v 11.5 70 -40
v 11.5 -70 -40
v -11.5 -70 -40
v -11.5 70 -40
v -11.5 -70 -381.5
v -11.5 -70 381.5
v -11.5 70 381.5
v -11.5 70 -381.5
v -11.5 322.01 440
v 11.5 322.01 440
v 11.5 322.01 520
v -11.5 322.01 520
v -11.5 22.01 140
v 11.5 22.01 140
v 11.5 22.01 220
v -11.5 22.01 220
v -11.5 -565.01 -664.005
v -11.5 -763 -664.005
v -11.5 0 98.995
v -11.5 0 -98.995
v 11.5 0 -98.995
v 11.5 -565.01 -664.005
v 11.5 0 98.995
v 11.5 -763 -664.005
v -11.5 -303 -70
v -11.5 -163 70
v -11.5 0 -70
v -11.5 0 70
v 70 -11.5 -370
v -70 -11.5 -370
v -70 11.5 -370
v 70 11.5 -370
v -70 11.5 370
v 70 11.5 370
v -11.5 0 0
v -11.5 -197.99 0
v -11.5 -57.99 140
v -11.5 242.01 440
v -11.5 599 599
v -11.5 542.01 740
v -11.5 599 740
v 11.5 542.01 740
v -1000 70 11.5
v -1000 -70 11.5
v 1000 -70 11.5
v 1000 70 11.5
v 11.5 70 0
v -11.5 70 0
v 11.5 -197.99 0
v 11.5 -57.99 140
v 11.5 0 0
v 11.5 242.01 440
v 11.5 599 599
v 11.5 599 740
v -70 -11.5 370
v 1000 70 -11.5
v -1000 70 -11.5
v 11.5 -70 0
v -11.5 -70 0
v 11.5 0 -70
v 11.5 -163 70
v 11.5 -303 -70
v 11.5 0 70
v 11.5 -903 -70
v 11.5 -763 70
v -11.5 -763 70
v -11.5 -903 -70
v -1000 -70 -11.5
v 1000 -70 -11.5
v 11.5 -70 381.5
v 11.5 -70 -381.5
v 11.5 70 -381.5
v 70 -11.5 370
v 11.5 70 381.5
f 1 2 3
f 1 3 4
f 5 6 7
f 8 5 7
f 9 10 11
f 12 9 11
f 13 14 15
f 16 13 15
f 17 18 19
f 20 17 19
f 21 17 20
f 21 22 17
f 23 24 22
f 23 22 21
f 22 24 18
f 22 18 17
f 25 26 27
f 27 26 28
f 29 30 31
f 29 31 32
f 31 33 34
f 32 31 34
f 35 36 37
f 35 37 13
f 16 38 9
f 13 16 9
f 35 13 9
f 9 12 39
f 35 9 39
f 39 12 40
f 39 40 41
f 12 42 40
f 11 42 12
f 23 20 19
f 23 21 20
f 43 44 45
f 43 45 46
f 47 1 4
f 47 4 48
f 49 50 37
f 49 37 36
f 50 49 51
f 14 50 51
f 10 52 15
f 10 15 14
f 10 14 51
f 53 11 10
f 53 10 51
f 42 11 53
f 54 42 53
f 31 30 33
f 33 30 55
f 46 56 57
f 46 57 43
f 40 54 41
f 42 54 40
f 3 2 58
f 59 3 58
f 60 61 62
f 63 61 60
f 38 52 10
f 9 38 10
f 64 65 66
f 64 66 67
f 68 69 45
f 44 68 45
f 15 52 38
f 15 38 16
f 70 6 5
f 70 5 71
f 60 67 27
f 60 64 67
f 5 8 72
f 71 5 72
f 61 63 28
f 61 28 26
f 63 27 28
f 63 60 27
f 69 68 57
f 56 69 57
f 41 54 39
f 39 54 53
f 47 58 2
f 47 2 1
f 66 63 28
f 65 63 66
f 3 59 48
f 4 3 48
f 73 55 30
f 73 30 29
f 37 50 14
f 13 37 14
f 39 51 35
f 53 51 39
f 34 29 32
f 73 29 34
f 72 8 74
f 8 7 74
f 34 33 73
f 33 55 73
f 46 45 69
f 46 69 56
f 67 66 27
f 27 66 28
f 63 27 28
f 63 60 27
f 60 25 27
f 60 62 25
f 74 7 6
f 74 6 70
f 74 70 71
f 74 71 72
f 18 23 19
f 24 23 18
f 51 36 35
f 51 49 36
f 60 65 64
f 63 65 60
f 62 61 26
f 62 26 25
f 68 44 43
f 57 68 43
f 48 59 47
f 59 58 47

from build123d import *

# Parameters (mm, degrees)
F0_W      = 140
F0_H      = 23
F1_DEPTH  = 1000
F2_W      = 23
F2_H      = 140
F3_DEPTH  = 381.5
F5_DEPTH  = 11.5
F7_DEPTH  = 11.5
F9_DEPTH  = 11.5
F10_W     = 140
F10_H     = 740
F11_DEPTH = 11.5
F13_DEPTH = 11.5
F15_DEPTH = 23
F17_DEPTH = 23
F19_DEPTH = 23
F20_W     = 140
F20_H     = 40
F21_DEPTH = 11.5


with BuildPart() as f1:
    # F0 (on Right) → F1 (new body, symmetric)
    with BuildSketch(Plane.YZ):
        Rectangle(F0_W, F0_H)
    extrude(amount=F1_DEPTH, both=True)


with BuildPart() as f3:
    # F2 (on Top) → F3 (new body, symmetric)
    with BuildSketch(Plane.XY):
        Rectangle(F2_W, F2_H)
    extrude(amount=F3_DEPTH, both=True)


with BuildPart() as f5:
    # F4 (on Right) → F5 (new body, symmetric)
    with BuildSketch(Plane.YZ):
        Polygon((0, -98.9949493661), (0, 98.9949493661), (-763, -664.0050506339), (-565.0101012678, -664.0050506339), align=None)
    extrude(amount=F5_DEPTH, both=True)


with BuildPart() as f7:
    # F6 (on Right) → F7 (new body, symmetric)
    with BuildSketch(Plane.YZ):
        Polygon((0, -70), (0, 70), (-163, 70), (-303, -70), align=None)
    extrude(amount=F7_DEPTH, both=True)


with BuildPart() as f9:
    # F8 (on Right) → F9 (new body, symmetric)
    with BuildSketch(Plane.YZ):
        Polygon((0, -70), (0, 70), (-763, 70), (-903, -70), align=None)
    extrude(amount=F9_DEPTH, both=True)


with BuildPart() as f11:
    # F10 (on Front) → F11 (new body, symmetric)
    with BuildSketch(Plane.XZ):
        Rectangle(F10_W, F10_H)
    extrude(amount=F11_DEPTH, both=True)


with BuildPart() as f13:
    # F12 (on Right) → F13 (new body, symmetric)
    with BuildSketch(Plane.YZ):
        Polygon((-197.9898987322, 0), (0, 0), (740, 740), (542.0101012678, 740), align=None)
    extrude(amount=F13_DEPTH, both=True)

    # F14 (on face) → F15 (cut, through all)
    with BuildSketch(Plane.YZ.offset(11.5)):
        Polygon((22.0101012678, 220), (-57.9898987322, 140), (22.0101012678, 140), align=None)
    extrude(amount=-F15_DEPTH, mode=Mode.SUBTRACT)

    # F16 (on face) → F17 (cut, through all)
    with BuildSketch(Plane.YZ.offset(11.5)):
        Polygon((322.0101012678, 520), (242.0101012678, 440), (322.0101012678, 440), align=None)
    extrude(amount=-F17_DEPTH, mode=Mode.SUBTRACT)

    # F18 (on face) → F19 (cut, through all)
    with BuildSketch(Plane.YZ.offset(11.5)):
        Polygon((740, 740), (599, 740), (599, 599), align=None)
    extrude(amount=-F19_DEPTH, mode=Mode.SUBTRACT)


with BuildPart() as f21:
    # F20 (on Right) → F21 (new body, symmetric)
    with BuildSketch(Plane.YZ):
        with Locations((0, -20)):
            Rectangle(F20_W, F20_H)
    extrude(amount=F21_DEPTH, both=True)


solid = Compound([f1.part, f3.part, f5.part, f7.part, f9.part, f11.part, f13.part, f21.part])
